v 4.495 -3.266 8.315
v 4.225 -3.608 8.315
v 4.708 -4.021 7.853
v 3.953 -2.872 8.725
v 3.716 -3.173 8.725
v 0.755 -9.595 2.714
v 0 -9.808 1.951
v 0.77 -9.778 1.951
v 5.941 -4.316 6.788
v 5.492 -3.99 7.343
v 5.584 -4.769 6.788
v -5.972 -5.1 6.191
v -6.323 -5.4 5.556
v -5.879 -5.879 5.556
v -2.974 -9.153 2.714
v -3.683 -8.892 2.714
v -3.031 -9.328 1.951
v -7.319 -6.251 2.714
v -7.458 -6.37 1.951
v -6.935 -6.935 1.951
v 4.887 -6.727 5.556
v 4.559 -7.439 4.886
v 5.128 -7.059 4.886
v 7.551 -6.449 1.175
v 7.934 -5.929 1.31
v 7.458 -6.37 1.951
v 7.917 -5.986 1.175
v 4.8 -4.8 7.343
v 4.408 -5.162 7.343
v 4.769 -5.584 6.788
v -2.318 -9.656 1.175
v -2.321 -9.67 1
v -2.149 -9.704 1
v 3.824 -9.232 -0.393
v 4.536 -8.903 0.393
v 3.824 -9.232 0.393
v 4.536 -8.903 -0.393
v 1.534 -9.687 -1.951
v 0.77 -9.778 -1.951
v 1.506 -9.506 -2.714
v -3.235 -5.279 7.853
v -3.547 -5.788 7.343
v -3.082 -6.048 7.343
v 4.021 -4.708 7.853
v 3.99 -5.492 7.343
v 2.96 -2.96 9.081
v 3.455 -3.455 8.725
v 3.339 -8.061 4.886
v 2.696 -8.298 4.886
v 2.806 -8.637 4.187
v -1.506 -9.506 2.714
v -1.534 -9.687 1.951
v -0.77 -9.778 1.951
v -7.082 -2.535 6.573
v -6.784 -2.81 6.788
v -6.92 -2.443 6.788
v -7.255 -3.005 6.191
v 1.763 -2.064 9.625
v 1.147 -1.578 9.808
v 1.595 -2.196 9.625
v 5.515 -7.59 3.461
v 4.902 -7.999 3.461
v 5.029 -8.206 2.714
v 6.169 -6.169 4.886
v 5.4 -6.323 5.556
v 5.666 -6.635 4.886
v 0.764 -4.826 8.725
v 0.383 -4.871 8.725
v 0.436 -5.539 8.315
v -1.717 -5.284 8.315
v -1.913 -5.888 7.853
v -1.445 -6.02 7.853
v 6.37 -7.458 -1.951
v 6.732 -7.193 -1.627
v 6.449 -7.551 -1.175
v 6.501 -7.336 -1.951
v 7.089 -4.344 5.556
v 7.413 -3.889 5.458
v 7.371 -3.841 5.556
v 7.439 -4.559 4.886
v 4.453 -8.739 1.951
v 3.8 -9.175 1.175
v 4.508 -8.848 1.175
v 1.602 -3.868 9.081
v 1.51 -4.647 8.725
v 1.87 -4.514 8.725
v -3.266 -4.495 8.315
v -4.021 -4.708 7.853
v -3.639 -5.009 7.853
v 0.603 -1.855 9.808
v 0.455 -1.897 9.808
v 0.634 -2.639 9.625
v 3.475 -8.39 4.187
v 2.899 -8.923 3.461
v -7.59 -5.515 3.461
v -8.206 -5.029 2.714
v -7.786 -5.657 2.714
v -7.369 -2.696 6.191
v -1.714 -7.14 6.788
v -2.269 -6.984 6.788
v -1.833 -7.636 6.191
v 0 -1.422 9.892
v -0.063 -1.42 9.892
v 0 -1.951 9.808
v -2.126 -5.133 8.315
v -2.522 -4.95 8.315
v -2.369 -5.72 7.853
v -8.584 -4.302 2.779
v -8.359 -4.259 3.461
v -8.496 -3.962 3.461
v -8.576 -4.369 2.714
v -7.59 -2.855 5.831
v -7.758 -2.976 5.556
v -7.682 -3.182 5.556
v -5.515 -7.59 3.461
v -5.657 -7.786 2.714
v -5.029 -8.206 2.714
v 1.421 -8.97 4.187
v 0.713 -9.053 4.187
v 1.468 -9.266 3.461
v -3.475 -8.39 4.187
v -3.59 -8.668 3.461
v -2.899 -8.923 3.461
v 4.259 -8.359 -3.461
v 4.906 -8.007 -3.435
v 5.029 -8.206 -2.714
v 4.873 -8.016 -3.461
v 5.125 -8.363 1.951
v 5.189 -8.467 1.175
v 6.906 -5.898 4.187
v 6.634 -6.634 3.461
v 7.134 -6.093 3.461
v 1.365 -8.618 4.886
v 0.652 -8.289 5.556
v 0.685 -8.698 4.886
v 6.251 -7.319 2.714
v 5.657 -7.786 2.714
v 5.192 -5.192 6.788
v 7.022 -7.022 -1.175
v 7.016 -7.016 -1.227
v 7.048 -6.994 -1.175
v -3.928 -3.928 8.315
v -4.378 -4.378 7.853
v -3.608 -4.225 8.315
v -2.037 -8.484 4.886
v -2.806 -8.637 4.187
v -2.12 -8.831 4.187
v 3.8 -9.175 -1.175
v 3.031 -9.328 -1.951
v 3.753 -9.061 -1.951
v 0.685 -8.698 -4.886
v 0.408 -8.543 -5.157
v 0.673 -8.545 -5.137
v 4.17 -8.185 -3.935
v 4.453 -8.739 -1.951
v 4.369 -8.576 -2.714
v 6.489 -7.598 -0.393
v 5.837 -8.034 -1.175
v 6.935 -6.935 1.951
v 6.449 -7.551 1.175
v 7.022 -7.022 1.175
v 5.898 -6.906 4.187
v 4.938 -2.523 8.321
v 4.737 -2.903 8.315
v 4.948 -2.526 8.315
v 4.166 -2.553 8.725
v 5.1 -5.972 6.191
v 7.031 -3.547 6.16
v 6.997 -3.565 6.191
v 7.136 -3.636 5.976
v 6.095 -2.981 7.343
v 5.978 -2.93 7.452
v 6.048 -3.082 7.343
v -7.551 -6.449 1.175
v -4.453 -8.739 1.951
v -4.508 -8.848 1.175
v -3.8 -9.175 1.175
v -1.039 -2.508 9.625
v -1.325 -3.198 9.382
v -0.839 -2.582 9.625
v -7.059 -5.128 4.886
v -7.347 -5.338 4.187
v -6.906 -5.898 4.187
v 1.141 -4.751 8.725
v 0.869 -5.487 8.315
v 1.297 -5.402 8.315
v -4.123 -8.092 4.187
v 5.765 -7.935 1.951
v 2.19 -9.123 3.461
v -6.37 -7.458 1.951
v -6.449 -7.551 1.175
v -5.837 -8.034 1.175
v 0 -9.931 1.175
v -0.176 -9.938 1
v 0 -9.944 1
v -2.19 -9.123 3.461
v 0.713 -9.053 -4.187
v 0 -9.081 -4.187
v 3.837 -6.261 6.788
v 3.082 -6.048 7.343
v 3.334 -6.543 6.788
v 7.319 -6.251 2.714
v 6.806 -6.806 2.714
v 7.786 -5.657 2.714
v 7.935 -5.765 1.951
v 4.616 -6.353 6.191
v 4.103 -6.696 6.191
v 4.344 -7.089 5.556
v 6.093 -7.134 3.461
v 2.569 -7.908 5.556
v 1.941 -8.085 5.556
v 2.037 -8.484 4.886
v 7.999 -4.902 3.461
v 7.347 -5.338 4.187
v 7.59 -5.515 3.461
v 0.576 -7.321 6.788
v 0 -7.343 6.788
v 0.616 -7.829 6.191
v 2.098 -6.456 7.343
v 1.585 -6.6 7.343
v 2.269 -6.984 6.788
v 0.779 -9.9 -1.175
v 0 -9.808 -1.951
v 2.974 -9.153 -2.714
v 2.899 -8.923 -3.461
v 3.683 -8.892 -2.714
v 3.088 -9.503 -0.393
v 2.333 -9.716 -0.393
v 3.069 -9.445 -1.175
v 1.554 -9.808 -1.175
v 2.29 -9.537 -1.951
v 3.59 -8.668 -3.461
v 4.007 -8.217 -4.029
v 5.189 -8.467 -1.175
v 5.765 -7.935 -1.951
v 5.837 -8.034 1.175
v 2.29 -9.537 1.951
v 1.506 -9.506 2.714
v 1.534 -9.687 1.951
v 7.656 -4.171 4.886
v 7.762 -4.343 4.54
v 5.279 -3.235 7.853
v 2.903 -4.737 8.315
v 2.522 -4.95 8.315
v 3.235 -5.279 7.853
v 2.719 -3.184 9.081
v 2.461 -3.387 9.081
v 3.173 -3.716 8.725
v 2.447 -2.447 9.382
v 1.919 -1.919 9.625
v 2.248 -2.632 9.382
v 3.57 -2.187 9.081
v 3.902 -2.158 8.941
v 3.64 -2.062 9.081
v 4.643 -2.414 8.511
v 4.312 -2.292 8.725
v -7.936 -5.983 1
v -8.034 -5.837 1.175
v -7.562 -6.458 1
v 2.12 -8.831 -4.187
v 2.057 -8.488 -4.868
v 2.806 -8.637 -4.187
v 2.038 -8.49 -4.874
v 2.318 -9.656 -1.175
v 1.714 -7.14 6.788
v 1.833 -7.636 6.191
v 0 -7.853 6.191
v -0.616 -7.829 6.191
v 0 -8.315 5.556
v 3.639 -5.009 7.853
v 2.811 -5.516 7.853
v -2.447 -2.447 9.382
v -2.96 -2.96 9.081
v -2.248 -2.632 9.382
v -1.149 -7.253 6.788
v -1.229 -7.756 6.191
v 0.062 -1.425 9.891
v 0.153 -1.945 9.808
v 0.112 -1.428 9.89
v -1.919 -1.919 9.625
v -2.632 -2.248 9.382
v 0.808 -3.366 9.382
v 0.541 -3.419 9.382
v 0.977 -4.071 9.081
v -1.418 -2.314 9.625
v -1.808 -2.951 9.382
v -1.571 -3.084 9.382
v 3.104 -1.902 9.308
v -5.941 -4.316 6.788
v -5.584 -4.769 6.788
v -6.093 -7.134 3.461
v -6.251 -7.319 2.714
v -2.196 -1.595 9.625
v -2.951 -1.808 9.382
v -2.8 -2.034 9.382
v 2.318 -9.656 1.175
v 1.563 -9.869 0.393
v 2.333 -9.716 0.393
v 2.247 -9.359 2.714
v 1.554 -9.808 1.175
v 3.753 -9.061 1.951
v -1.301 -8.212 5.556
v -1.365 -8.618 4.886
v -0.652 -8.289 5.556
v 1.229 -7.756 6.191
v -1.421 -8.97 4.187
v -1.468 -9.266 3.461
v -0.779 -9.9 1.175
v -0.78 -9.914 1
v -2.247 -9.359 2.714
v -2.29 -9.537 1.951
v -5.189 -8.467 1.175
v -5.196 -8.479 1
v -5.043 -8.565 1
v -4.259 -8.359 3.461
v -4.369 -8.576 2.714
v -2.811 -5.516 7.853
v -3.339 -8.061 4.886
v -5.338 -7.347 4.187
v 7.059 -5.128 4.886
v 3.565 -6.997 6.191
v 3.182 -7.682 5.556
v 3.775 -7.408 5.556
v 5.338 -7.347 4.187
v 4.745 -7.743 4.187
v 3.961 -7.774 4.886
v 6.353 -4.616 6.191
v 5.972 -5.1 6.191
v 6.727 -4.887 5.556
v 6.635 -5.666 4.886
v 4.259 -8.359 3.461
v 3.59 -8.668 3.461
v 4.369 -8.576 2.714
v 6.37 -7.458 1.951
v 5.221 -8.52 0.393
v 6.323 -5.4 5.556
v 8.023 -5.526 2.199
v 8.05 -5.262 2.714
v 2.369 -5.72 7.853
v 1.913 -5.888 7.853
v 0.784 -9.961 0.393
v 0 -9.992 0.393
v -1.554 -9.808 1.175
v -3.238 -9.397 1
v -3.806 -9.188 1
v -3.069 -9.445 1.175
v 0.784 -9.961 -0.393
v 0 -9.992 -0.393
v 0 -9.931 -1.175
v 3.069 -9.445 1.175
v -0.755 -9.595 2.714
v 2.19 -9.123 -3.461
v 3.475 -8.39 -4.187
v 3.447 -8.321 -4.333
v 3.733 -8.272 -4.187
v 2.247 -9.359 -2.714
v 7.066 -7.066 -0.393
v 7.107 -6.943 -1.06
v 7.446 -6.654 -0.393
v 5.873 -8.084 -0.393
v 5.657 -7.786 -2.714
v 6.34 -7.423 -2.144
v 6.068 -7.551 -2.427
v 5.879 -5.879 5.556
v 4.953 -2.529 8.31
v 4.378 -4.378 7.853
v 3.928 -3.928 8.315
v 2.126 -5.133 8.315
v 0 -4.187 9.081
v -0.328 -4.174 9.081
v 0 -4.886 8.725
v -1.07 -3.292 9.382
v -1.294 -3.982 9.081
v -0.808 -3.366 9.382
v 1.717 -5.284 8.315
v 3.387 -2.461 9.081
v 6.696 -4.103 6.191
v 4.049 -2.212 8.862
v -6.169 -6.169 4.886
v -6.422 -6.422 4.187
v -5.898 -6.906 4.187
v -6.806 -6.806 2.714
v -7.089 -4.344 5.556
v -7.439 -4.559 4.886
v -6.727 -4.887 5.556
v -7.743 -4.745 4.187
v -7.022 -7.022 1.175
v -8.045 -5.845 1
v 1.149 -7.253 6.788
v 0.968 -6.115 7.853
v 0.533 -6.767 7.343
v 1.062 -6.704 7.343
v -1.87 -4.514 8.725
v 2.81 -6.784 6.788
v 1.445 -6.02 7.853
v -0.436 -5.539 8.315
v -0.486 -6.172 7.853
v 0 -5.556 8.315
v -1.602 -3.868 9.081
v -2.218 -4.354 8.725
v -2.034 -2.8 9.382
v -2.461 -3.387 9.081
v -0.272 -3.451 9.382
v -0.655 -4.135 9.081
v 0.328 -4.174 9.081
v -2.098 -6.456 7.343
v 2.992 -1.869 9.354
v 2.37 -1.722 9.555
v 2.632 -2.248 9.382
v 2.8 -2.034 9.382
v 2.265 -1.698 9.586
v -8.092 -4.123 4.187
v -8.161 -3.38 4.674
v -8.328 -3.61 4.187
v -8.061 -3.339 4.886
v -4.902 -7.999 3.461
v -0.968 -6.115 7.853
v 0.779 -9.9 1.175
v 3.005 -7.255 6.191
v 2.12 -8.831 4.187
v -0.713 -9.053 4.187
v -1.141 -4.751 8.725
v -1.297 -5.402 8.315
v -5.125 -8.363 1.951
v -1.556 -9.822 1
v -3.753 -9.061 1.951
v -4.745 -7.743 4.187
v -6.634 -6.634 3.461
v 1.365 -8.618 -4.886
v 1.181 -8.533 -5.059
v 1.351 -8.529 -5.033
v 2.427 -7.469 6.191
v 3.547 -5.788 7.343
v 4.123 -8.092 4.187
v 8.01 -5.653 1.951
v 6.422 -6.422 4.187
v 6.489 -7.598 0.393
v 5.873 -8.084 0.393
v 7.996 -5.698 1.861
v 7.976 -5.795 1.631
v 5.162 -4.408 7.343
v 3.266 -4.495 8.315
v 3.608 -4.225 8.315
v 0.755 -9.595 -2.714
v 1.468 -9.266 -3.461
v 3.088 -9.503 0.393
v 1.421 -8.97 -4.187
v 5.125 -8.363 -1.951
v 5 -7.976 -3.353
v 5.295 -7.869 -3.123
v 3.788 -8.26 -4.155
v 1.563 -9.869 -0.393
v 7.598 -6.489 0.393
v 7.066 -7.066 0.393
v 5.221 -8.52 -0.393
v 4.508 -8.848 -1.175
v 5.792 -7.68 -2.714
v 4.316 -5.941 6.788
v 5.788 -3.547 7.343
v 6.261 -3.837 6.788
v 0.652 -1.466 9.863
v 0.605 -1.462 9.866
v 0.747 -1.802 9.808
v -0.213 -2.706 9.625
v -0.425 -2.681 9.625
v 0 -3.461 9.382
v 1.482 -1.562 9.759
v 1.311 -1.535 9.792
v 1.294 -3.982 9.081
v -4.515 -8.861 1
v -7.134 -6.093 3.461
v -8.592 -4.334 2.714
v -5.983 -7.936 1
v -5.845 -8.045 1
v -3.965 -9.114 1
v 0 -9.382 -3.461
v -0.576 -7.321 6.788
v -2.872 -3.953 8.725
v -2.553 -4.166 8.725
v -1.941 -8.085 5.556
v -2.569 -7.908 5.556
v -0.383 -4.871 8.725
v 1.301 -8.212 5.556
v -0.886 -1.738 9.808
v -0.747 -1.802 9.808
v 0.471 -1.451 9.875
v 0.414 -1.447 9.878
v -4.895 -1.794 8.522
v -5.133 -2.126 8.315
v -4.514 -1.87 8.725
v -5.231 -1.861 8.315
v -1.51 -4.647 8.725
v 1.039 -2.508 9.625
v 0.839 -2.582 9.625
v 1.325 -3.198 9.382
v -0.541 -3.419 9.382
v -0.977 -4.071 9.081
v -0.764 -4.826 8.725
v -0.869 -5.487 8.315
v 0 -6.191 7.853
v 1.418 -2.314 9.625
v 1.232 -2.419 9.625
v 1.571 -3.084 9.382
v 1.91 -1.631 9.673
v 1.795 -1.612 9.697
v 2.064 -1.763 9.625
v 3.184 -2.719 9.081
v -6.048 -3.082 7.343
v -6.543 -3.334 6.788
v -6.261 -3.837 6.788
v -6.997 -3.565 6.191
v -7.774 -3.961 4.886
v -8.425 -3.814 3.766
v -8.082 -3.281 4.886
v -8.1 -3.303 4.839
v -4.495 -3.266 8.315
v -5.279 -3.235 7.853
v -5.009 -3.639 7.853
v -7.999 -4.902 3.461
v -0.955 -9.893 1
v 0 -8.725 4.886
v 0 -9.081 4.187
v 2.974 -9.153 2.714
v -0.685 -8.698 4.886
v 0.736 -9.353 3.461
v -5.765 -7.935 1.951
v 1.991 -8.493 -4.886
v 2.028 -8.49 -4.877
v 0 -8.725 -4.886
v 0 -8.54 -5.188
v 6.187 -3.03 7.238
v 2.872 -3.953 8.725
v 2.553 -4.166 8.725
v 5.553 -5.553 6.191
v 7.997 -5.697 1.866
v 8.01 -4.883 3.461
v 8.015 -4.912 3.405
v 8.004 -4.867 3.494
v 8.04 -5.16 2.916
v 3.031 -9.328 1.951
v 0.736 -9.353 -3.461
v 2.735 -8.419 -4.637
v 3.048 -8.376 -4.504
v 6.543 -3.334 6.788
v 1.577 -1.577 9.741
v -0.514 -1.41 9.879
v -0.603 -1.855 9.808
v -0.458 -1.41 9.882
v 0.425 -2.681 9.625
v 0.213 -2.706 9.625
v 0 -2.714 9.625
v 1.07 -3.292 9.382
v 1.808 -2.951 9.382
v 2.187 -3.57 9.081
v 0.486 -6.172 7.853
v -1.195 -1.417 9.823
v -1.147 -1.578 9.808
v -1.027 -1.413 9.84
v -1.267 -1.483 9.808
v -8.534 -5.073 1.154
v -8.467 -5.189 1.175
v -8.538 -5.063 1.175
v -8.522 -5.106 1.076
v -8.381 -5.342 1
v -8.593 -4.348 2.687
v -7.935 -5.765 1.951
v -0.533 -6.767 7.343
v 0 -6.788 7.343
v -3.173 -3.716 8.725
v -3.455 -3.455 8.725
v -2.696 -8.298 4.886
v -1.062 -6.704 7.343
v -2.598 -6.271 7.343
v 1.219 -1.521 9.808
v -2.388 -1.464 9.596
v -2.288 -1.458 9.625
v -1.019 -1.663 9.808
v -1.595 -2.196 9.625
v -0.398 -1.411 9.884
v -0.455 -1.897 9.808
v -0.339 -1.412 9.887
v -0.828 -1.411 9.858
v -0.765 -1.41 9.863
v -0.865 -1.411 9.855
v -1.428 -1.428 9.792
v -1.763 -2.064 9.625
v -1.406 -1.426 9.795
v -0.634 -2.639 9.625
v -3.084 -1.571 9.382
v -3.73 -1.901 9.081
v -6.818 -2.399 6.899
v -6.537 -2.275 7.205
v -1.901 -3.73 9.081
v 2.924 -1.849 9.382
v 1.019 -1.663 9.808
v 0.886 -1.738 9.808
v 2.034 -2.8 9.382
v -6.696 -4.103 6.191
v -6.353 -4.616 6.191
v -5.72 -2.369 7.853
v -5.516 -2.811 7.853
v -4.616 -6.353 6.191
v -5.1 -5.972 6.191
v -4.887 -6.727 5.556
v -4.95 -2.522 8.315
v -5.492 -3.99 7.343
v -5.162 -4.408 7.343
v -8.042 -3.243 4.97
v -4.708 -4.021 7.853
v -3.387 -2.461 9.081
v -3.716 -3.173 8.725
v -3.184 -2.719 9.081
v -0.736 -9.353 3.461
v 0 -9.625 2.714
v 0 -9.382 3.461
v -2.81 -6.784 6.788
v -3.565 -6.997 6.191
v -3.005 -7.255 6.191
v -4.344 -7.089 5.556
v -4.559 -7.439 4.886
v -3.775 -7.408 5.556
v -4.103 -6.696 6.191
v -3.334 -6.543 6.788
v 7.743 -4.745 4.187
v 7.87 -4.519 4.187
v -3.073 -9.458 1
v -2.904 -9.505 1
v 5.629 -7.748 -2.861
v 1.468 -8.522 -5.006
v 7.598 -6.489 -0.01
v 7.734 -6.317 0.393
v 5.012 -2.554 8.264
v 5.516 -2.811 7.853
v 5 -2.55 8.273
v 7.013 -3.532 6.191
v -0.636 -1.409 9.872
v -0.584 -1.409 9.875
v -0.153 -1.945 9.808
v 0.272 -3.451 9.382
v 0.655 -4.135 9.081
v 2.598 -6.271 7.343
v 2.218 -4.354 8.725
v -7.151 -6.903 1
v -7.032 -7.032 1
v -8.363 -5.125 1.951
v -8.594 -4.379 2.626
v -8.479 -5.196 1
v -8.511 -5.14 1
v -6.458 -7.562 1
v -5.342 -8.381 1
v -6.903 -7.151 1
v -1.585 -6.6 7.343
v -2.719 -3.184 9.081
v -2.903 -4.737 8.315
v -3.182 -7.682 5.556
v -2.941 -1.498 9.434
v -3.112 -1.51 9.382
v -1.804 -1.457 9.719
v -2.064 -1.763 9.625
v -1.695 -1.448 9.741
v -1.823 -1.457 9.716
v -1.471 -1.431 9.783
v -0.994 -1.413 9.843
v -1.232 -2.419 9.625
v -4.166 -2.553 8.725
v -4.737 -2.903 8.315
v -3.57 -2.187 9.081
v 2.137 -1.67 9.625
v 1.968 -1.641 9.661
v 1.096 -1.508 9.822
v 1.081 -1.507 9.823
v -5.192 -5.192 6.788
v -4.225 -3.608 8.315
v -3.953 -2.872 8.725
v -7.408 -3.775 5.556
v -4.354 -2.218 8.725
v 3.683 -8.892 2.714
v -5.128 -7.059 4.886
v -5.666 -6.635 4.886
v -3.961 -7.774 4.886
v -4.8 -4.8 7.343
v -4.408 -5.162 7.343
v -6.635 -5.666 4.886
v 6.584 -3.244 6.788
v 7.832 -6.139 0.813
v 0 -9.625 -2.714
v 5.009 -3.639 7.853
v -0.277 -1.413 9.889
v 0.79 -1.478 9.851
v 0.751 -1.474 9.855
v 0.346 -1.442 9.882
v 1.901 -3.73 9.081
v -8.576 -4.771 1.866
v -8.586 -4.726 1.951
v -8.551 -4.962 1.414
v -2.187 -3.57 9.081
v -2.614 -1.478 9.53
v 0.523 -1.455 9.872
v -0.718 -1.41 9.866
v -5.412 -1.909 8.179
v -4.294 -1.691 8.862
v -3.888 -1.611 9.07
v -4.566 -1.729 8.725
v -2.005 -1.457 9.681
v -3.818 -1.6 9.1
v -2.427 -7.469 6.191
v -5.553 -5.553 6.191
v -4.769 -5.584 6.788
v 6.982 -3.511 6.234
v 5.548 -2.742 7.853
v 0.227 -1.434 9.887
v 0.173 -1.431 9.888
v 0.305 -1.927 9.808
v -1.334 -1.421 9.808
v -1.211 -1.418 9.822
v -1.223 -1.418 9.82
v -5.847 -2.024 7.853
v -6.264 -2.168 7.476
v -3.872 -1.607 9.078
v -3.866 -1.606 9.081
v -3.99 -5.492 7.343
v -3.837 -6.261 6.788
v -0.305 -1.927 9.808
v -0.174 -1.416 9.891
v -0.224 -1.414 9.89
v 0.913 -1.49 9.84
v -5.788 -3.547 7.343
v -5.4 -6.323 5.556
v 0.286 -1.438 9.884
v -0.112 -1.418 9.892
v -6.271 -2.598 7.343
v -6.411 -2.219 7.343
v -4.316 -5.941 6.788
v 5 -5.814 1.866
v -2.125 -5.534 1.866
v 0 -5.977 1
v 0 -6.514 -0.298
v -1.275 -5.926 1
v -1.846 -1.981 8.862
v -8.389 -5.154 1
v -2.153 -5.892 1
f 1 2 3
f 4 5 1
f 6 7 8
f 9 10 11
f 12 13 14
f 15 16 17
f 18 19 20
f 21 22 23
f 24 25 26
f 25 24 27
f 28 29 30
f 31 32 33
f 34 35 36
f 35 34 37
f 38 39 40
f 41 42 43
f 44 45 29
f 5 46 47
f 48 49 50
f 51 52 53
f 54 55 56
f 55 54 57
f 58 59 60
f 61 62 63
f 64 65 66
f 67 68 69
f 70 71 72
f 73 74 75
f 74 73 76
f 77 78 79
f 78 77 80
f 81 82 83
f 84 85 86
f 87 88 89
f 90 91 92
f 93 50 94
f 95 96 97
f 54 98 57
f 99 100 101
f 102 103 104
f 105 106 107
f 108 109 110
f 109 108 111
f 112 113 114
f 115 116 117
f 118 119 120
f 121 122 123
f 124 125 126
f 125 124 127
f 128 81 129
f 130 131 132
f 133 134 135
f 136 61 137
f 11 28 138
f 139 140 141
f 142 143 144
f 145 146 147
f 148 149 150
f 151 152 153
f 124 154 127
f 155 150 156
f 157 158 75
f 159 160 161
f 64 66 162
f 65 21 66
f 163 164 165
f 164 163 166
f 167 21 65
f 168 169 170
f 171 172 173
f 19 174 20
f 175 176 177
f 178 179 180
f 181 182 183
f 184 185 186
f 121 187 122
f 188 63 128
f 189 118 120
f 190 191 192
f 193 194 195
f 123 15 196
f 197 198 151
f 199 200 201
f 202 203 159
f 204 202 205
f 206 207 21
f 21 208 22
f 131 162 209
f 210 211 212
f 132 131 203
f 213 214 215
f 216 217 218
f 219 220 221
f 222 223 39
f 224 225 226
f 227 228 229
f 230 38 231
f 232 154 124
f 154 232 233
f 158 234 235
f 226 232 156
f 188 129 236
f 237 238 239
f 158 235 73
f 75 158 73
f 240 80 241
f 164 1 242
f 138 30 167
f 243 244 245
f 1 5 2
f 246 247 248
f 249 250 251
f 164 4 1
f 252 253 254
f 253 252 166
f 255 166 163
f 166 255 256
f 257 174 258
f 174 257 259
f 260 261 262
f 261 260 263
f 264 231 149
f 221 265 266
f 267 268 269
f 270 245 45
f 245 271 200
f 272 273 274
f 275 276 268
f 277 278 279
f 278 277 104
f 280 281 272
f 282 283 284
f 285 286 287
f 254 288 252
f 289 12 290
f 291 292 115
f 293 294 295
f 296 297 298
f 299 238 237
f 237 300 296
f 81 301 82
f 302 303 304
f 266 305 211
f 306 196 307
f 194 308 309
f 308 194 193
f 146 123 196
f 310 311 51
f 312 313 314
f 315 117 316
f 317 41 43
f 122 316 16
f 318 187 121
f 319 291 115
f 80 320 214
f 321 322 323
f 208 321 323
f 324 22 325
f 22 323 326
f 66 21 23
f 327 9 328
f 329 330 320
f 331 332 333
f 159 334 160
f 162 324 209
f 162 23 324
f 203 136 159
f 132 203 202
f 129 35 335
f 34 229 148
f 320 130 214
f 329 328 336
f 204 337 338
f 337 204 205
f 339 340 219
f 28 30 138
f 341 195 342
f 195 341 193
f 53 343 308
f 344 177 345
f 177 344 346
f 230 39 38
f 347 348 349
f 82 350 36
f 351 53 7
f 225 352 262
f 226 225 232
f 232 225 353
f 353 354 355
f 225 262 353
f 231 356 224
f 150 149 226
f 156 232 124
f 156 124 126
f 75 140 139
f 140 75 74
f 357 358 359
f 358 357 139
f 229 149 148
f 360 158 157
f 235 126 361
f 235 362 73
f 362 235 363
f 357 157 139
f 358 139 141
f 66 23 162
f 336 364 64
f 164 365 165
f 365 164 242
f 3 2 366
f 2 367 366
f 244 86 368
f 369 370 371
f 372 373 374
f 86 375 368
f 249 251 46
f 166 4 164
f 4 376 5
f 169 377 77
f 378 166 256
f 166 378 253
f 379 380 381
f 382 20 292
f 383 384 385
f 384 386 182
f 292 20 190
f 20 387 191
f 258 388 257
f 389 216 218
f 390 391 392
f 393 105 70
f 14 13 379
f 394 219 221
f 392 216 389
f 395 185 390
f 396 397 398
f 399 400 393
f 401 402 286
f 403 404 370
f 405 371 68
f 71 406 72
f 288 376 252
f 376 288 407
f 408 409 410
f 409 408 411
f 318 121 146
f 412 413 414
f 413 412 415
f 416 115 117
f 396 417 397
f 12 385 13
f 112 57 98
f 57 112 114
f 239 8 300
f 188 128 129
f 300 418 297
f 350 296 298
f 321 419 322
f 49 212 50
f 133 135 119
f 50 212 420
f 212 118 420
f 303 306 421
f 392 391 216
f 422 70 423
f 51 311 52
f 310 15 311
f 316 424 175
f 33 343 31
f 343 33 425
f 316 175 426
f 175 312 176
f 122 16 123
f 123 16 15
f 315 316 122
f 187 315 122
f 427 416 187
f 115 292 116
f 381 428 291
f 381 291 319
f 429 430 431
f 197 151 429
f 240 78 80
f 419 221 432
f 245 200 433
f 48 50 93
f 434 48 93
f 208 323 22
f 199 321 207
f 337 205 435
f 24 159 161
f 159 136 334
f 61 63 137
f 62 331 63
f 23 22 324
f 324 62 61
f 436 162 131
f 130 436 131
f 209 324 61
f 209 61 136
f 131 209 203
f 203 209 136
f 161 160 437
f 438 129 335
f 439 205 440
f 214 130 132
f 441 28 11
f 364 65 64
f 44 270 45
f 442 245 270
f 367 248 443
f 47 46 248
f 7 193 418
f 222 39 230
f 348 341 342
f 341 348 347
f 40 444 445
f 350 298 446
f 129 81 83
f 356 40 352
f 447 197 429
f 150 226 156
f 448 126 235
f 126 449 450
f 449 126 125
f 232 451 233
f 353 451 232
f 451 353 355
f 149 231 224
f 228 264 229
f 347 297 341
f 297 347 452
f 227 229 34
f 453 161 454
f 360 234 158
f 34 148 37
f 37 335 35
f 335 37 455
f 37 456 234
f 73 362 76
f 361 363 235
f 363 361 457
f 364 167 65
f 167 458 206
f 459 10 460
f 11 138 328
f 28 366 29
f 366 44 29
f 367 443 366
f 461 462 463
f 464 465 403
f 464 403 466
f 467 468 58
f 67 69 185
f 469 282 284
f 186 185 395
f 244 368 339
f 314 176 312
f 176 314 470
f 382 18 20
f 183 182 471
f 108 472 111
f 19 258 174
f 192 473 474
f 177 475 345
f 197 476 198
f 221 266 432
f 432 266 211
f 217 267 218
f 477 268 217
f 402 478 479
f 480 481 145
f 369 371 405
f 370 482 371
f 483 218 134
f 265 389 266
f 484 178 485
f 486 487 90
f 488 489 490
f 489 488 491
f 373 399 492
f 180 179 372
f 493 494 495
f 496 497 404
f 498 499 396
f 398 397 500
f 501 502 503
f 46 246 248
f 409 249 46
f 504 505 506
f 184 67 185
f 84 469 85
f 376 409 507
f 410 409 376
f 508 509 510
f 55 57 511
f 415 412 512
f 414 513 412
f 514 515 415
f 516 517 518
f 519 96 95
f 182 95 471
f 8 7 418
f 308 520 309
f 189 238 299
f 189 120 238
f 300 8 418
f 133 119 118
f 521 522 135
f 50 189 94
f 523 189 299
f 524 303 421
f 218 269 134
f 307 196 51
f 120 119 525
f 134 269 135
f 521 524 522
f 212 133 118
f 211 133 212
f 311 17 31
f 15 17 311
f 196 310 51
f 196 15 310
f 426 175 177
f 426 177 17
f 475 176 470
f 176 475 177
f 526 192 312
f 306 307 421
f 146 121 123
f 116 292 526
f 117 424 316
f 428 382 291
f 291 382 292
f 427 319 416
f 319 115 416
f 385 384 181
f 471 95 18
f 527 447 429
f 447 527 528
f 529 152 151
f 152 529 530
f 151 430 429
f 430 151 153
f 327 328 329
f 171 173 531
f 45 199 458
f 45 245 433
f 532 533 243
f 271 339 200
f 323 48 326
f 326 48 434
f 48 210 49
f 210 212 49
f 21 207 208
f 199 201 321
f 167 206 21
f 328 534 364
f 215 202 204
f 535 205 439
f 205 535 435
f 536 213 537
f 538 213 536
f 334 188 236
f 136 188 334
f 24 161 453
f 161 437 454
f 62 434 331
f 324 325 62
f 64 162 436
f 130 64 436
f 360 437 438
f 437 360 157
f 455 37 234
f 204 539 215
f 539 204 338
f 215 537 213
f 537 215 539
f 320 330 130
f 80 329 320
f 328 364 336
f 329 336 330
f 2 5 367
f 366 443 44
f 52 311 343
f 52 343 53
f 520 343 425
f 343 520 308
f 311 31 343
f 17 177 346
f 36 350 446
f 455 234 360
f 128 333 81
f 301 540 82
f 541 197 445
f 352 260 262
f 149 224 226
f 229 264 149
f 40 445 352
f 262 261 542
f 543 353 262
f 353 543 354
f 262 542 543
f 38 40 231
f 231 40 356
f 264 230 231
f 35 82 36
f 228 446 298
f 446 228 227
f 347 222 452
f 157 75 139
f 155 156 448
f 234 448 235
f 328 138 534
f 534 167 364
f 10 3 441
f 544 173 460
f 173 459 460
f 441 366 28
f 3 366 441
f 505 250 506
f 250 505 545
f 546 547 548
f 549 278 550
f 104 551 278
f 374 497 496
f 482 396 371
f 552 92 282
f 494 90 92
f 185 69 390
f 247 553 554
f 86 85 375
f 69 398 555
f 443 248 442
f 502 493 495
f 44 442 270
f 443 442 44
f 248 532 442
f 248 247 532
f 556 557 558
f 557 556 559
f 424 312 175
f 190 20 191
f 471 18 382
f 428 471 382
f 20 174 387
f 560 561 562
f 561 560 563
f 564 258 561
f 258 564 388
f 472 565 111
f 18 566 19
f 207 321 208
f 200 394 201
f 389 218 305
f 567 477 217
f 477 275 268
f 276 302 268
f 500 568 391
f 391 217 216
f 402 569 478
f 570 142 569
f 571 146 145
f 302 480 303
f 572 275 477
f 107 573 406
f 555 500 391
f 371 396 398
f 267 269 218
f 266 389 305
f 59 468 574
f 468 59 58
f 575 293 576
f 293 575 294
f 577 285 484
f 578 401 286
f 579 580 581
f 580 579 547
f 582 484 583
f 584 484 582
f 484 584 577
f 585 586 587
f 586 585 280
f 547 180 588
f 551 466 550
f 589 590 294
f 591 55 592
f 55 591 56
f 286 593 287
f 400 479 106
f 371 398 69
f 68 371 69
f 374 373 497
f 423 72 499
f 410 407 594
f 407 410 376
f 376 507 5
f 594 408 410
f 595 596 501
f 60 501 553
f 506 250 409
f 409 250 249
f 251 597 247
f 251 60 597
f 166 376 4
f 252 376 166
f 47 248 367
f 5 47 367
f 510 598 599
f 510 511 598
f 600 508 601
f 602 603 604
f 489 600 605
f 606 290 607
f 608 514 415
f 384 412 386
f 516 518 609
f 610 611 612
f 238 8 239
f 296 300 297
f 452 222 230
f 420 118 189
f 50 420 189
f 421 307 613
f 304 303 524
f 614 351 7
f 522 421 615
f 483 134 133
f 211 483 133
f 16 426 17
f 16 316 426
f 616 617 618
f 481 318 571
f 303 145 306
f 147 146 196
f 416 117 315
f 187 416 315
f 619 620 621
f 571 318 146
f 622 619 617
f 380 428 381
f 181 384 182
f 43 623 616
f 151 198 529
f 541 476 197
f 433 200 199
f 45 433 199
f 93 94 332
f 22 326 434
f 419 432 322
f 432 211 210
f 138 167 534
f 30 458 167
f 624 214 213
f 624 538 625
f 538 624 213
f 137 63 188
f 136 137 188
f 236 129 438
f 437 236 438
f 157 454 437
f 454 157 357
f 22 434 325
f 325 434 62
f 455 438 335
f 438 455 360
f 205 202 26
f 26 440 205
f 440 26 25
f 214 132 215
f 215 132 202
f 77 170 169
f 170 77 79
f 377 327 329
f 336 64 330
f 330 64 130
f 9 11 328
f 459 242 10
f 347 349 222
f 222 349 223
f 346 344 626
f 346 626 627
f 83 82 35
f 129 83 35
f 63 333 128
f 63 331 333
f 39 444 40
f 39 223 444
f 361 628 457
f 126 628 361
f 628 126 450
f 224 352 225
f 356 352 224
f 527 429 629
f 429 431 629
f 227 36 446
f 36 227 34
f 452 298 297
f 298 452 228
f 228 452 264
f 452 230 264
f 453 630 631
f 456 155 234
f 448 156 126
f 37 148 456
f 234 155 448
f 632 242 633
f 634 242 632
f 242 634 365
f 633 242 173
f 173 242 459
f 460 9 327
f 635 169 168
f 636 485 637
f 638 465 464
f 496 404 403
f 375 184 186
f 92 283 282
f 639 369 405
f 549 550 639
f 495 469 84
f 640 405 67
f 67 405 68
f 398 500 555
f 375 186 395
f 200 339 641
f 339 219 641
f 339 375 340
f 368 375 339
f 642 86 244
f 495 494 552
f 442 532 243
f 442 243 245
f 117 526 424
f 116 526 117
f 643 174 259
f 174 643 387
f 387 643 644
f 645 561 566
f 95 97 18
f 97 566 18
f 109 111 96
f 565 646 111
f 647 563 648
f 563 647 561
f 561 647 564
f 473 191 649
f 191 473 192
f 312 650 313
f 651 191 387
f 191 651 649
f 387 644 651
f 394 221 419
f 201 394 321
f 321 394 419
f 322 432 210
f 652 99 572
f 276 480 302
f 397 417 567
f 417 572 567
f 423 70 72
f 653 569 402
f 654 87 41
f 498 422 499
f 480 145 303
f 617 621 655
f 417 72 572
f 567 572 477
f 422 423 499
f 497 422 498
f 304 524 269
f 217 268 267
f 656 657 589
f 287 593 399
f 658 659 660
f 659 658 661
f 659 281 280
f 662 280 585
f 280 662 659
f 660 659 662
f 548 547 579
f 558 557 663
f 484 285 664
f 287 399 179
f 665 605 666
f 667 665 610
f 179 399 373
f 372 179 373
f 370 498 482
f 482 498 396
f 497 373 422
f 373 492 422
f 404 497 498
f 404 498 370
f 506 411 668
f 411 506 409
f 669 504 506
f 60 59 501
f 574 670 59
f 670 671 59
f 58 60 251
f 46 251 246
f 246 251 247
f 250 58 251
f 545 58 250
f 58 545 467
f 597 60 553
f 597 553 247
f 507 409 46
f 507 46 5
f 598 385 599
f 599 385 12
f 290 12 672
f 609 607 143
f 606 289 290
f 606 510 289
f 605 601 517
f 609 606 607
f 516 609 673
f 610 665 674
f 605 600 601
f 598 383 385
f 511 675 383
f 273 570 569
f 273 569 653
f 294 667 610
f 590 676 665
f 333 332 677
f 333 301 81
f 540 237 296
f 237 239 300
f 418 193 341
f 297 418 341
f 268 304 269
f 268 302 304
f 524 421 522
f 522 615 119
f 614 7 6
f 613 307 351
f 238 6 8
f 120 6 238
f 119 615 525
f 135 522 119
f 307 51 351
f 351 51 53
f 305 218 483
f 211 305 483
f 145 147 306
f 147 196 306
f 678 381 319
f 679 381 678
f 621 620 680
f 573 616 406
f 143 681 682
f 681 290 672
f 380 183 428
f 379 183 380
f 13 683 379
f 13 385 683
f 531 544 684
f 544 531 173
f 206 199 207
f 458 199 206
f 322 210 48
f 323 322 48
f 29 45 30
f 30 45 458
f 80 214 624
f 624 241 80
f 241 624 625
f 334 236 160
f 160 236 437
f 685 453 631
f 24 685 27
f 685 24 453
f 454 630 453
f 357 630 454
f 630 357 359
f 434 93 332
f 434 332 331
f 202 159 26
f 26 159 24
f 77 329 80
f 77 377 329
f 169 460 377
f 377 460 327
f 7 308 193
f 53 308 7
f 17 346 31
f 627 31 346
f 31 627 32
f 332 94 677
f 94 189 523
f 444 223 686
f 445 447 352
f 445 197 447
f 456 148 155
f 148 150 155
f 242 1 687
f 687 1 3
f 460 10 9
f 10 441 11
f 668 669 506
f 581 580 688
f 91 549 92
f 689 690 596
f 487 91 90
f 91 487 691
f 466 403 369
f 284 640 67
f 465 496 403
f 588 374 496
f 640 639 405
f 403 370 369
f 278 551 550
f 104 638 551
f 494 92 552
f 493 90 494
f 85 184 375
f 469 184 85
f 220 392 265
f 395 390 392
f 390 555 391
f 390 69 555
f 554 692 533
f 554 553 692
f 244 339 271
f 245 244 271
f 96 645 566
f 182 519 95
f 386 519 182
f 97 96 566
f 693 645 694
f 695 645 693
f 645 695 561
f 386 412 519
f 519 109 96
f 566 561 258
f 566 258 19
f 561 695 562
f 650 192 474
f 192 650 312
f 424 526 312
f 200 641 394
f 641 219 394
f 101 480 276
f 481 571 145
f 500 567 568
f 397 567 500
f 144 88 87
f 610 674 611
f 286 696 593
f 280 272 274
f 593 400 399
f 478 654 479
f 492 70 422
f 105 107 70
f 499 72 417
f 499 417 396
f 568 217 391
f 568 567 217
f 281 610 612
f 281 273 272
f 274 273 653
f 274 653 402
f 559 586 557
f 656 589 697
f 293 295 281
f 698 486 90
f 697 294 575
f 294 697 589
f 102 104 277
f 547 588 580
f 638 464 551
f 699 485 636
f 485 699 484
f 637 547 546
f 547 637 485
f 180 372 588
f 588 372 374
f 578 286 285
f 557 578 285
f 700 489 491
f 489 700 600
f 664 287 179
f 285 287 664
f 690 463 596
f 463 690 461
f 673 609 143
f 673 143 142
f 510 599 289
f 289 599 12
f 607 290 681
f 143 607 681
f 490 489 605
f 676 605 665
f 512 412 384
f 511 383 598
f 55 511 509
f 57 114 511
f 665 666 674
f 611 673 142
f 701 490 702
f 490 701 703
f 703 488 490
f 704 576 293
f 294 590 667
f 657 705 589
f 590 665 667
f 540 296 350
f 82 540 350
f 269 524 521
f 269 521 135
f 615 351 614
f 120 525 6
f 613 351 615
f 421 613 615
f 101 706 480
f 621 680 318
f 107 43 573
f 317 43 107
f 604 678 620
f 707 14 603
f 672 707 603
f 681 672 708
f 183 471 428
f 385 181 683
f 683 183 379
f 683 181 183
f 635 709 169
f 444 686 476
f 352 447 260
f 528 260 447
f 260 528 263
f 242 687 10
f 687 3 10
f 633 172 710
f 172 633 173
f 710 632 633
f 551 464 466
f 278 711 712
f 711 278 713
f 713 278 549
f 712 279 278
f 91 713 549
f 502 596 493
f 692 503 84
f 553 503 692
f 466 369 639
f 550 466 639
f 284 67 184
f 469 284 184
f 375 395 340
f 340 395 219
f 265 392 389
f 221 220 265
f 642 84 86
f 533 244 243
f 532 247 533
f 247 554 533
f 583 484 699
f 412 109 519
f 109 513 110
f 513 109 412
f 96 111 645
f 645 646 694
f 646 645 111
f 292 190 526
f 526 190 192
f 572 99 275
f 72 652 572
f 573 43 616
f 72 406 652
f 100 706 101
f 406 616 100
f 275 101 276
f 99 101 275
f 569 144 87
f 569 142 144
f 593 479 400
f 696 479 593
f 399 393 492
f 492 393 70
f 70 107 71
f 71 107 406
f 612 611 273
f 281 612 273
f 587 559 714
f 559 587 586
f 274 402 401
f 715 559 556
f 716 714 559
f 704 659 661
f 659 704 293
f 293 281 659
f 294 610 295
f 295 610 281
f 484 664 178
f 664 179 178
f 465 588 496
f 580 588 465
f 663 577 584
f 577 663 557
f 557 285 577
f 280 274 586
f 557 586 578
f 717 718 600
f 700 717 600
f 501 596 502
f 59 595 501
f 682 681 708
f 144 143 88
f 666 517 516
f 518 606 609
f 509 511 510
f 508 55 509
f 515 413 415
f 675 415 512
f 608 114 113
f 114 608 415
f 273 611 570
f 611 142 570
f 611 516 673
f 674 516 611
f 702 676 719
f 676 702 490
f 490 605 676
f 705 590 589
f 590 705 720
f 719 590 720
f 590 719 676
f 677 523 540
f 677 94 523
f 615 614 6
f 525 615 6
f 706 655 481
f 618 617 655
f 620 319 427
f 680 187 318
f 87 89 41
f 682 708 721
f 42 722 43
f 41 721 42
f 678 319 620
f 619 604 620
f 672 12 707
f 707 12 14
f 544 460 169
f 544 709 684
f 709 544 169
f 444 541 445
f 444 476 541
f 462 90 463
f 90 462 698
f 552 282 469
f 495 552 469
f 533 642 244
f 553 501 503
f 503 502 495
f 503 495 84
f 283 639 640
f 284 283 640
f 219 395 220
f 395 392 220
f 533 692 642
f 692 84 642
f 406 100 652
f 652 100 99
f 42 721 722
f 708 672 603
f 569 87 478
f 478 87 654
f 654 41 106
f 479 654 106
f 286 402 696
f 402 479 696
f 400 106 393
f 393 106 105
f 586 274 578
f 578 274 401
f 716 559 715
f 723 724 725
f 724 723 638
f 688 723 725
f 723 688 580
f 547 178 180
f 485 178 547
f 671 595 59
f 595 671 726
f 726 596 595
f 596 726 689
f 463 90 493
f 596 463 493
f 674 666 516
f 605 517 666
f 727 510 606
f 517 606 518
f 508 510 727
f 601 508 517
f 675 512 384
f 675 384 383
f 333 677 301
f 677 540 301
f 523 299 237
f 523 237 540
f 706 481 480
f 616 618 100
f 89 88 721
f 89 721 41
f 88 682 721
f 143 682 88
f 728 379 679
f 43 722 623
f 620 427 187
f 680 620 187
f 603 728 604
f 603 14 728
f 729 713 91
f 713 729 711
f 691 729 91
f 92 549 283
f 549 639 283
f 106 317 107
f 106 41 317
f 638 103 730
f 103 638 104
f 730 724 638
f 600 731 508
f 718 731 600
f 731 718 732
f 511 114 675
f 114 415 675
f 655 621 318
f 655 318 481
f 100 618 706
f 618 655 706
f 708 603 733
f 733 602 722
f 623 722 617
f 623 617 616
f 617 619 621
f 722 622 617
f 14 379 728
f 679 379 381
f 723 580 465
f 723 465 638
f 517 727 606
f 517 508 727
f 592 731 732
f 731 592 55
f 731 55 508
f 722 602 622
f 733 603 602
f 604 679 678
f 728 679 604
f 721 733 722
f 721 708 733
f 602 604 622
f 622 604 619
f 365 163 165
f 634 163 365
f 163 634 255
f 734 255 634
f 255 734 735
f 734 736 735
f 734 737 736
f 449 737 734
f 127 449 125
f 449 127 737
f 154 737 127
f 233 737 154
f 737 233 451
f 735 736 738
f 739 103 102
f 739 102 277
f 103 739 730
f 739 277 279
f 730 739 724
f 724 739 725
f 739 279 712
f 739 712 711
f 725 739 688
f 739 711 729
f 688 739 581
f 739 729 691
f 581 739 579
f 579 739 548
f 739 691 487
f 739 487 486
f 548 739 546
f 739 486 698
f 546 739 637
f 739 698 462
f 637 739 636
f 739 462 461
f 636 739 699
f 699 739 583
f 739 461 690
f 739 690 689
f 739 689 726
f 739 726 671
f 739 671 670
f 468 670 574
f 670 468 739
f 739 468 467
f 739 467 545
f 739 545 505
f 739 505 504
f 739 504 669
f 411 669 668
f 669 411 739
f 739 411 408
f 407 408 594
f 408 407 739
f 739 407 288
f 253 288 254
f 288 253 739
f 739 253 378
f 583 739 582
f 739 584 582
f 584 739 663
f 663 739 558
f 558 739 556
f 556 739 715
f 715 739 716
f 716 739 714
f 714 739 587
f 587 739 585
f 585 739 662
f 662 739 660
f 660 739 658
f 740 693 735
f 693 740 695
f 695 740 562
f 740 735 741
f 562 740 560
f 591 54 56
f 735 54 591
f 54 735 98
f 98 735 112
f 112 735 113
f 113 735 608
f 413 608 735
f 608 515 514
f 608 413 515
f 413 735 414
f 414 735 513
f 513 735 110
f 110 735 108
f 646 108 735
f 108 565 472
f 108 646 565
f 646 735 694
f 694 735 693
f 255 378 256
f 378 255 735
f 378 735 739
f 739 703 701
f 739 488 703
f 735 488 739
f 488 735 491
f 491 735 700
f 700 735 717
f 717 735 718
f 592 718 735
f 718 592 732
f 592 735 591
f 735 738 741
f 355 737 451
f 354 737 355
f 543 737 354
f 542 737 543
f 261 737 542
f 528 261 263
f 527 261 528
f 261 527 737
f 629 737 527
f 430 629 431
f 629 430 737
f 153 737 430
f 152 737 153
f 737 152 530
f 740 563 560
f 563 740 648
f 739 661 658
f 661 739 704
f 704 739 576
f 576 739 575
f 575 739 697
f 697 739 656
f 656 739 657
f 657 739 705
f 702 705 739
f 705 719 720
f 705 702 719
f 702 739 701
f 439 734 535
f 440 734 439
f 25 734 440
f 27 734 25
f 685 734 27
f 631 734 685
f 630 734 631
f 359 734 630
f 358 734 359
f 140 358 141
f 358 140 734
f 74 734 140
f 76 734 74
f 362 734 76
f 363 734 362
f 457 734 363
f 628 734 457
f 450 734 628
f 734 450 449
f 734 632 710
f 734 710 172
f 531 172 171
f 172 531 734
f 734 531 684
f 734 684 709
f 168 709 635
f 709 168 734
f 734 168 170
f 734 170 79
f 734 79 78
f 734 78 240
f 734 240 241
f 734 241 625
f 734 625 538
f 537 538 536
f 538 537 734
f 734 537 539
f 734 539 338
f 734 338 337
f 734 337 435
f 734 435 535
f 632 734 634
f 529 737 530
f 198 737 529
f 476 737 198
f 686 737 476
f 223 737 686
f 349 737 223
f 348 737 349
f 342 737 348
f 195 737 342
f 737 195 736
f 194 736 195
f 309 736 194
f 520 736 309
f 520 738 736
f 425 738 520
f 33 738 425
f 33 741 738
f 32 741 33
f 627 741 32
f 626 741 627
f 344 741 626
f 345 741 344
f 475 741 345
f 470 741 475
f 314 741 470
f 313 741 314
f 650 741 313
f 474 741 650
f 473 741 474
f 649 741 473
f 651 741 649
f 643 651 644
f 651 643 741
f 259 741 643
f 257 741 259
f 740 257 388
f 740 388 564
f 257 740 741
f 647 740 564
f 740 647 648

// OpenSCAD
$fn=80;


difference() 
{
sphere(r=10);
translate([5,85,-40])
    sphere(r=100);
translate([-10,-10,-10])
    cube([10,10,11]);
}
